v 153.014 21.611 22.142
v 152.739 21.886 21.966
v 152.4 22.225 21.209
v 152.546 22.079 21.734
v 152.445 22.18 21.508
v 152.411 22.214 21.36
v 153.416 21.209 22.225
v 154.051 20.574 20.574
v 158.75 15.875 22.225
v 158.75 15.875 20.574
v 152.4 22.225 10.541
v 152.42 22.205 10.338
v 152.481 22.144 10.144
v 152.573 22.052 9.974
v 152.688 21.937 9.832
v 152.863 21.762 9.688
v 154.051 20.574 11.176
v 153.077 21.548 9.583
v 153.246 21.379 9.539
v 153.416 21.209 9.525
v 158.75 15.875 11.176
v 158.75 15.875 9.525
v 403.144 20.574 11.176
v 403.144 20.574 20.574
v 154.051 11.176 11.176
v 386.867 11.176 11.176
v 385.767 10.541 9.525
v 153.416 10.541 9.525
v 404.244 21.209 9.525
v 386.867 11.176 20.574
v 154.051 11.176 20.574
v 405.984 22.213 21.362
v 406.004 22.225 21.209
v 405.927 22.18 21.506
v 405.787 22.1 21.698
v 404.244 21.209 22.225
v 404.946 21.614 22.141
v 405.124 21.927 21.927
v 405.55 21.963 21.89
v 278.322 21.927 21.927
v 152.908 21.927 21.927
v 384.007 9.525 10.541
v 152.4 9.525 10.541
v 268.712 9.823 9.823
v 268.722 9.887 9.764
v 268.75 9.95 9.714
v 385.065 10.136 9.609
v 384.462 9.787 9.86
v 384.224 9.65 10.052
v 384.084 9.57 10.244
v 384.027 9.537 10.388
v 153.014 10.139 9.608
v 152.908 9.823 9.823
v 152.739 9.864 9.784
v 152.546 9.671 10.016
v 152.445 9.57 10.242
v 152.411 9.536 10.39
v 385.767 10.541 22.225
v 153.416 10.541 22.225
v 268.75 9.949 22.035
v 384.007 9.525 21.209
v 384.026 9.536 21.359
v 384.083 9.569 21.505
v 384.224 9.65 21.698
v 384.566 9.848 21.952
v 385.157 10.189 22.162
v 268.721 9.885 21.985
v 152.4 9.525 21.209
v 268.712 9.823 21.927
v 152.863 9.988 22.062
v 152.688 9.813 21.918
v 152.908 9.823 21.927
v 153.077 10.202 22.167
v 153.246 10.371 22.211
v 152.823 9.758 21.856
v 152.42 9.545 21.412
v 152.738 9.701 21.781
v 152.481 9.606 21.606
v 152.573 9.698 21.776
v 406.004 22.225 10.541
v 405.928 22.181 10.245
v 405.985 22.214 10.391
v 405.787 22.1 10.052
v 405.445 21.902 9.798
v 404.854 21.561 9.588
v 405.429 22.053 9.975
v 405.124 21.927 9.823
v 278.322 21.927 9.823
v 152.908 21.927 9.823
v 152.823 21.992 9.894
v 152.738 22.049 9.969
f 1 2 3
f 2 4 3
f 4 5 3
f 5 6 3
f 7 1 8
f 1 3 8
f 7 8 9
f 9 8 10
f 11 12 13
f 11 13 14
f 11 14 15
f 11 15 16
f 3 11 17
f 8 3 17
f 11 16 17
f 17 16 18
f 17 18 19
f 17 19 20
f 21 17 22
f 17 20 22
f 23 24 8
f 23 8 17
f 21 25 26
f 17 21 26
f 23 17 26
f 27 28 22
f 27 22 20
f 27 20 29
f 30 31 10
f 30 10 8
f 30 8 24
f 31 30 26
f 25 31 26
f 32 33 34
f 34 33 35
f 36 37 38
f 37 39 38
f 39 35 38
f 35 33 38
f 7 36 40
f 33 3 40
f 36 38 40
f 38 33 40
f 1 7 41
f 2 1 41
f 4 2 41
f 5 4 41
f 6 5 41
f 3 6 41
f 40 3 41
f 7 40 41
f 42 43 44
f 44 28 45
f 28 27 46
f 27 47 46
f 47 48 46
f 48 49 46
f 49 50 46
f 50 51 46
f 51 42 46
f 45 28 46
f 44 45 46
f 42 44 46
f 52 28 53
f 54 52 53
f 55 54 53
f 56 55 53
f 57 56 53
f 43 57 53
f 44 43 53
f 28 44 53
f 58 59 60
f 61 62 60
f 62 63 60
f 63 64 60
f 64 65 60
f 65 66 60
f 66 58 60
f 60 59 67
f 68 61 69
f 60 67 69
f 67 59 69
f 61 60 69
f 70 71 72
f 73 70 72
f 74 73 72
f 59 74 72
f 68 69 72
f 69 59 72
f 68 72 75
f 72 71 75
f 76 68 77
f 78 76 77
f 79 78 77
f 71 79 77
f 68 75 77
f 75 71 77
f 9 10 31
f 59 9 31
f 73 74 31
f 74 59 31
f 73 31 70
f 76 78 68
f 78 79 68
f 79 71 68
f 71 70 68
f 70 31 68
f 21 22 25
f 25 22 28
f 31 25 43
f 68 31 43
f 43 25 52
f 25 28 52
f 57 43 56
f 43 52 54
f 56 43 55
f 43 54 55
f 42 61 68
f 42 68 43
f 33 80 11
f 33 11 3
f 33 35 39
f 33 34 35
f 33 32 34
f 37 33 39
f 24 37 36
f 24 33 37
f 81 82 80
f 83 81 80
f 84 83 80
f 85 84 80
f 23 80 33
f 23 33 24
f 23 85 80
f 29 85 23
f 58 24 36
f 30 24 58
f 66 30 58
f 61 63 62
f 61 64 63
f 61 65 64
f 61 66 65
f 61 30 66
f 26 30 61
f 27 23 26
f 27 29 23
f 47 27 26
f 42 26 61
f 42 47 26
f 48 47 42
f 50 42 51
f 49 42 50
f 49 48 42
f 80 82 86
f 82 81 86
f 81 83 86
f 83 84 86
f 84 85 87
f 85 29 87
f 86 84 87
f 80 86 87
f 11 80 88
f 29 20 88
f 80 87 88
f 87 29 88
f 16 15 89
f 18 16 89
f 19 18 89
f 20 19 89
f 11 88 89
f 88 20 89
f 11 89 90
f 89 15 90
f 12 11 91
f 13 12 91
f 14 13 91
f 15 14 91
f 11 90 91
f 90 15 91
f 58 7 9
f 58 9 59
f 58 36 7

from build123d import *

# Parameters (mm, degrees)
SKETCH1_W           = 23.495
SKETCH1_H           = 23.495
BOSS_EXTRUDE1_DEPTH = 508
SCALE1_SCALE_X      = 1
SCALE1_SCALE_Y      = 0.4
SCALE1_SCALE_Z      = 0.4
CUT_EXTRUDE1_REACH  = 510.645
CUT_EXTRUDE2_REACH  = 510.645


with BuildPart() as part:
    # Sketch1 → Boss-Extrude1 (new body)
    with BuildSketch(Plane(origin=(0, 0, 0), x_dir=(0, 0, -1), z_dir=(1, 0, 0))):
        with BuildLine():
            Line((0, 2.54), (0, 29.21))
            ThreePointArc((0, 29.21), (-0.743948776, 31.006051224), (-2.54, 31.75))
            Line((-2.54, 31.75), (-29.21, 31.75))
            ThreePointArc((-29.21, 31.75), (-31.006051224, 31.006051224), (-31.75, 29.21))
            Line((-31.75, 29.21), (-31.75, 2.54))
            ThreePointArc((-31.75, 2.54), (-31.006051224, 0.743948776), (-29.21, 0))
            Line((-29.21, 0), (-2.54, 0))
            ThreePointArc((-2.54, 0), (-0.743948776, 0.743948776), (0, 2.54))
        make_face()
        with Locations((-15.875, 15.875)):
            Rectangle(SKETCH1_W, SKETCH1_H, mode=Mode.SUBTRACT)
    extrude(amount=BOSS_EXTRUDE1_DEPTH)


with BuildPart() as part_1:
    # Scale1: scaled about (254, 15.875, 15.875)
    add(part.part.scale((SCALE1_SCALE_X, SCALE1_SCALE_Y, SCALE1_SCALE_Z), about=(254, 15.875, 15.875)))

    # Sketch2 → Cut-Extrude1 (cut, up to next)
    with BuildSketch(Plane(origin=(0, 0, 9.525), x_dir=(-1, 0, 0), z_dir=(0, 0, -1)), mode=Mode.PRIVATE) as cut_extrude1_sk1:
        Polygon((-158.75, 15.875), (-152.4, 9.525), (-132.341002805, 9.525), (-132.341002805, 22.225), (-152.4, 22.225), align=None)
    cut_extrude1_tool1 = extrude(cut_extrude1_sk1.sketch, amount=-CUT_EXTRUDE1_REACH, mode=Mode.PRIVATE) & part_1.part
    add(cut_extrude1_tool1.solids().sort_by_distance((144.030314, 15.875, 9.525))[0], mode=Mode.SUBTRACT)


with BuildPart() as cut_extrude1_kept_piece:
    # of the separate pieces the step leaves, the one the design keeps (cut_extrude1_pieces_kept)
    add(part_1.part.solids().sort_by_distance((158.75, 15.875, 9.525))[0])

    # Sketch3 → Cut-Extrude2 (cut, up to next)
    with BuildSketch(Plane(origin=(0, 0, 9.525), x_dir=(-1, 0, 0), z_dir=(0, 0, -1)), mode=Mode.PRIVATE) as cut_extrude2_sk1:
        Polygon((-406.004091145, 22.225), (-384.007045889, 9.525), (-508, 9.525), (-508, 22.225), align=None)
    cut_extrude2_tool1 = extrude(cut_extrude2_sk1.sketch, amount=-CUT_EXTRUDE2_REACH, mode=Mode.PRIVATE) & cut_extrude1_kept_piece.part
    add(cut_extrude2_tool1.solids().sort_by_distance((451.324357, 15.66897, 9.525))[0], mode=Mode.SUBTRACT)


solid = cut_extrude1_kept_piece.part
